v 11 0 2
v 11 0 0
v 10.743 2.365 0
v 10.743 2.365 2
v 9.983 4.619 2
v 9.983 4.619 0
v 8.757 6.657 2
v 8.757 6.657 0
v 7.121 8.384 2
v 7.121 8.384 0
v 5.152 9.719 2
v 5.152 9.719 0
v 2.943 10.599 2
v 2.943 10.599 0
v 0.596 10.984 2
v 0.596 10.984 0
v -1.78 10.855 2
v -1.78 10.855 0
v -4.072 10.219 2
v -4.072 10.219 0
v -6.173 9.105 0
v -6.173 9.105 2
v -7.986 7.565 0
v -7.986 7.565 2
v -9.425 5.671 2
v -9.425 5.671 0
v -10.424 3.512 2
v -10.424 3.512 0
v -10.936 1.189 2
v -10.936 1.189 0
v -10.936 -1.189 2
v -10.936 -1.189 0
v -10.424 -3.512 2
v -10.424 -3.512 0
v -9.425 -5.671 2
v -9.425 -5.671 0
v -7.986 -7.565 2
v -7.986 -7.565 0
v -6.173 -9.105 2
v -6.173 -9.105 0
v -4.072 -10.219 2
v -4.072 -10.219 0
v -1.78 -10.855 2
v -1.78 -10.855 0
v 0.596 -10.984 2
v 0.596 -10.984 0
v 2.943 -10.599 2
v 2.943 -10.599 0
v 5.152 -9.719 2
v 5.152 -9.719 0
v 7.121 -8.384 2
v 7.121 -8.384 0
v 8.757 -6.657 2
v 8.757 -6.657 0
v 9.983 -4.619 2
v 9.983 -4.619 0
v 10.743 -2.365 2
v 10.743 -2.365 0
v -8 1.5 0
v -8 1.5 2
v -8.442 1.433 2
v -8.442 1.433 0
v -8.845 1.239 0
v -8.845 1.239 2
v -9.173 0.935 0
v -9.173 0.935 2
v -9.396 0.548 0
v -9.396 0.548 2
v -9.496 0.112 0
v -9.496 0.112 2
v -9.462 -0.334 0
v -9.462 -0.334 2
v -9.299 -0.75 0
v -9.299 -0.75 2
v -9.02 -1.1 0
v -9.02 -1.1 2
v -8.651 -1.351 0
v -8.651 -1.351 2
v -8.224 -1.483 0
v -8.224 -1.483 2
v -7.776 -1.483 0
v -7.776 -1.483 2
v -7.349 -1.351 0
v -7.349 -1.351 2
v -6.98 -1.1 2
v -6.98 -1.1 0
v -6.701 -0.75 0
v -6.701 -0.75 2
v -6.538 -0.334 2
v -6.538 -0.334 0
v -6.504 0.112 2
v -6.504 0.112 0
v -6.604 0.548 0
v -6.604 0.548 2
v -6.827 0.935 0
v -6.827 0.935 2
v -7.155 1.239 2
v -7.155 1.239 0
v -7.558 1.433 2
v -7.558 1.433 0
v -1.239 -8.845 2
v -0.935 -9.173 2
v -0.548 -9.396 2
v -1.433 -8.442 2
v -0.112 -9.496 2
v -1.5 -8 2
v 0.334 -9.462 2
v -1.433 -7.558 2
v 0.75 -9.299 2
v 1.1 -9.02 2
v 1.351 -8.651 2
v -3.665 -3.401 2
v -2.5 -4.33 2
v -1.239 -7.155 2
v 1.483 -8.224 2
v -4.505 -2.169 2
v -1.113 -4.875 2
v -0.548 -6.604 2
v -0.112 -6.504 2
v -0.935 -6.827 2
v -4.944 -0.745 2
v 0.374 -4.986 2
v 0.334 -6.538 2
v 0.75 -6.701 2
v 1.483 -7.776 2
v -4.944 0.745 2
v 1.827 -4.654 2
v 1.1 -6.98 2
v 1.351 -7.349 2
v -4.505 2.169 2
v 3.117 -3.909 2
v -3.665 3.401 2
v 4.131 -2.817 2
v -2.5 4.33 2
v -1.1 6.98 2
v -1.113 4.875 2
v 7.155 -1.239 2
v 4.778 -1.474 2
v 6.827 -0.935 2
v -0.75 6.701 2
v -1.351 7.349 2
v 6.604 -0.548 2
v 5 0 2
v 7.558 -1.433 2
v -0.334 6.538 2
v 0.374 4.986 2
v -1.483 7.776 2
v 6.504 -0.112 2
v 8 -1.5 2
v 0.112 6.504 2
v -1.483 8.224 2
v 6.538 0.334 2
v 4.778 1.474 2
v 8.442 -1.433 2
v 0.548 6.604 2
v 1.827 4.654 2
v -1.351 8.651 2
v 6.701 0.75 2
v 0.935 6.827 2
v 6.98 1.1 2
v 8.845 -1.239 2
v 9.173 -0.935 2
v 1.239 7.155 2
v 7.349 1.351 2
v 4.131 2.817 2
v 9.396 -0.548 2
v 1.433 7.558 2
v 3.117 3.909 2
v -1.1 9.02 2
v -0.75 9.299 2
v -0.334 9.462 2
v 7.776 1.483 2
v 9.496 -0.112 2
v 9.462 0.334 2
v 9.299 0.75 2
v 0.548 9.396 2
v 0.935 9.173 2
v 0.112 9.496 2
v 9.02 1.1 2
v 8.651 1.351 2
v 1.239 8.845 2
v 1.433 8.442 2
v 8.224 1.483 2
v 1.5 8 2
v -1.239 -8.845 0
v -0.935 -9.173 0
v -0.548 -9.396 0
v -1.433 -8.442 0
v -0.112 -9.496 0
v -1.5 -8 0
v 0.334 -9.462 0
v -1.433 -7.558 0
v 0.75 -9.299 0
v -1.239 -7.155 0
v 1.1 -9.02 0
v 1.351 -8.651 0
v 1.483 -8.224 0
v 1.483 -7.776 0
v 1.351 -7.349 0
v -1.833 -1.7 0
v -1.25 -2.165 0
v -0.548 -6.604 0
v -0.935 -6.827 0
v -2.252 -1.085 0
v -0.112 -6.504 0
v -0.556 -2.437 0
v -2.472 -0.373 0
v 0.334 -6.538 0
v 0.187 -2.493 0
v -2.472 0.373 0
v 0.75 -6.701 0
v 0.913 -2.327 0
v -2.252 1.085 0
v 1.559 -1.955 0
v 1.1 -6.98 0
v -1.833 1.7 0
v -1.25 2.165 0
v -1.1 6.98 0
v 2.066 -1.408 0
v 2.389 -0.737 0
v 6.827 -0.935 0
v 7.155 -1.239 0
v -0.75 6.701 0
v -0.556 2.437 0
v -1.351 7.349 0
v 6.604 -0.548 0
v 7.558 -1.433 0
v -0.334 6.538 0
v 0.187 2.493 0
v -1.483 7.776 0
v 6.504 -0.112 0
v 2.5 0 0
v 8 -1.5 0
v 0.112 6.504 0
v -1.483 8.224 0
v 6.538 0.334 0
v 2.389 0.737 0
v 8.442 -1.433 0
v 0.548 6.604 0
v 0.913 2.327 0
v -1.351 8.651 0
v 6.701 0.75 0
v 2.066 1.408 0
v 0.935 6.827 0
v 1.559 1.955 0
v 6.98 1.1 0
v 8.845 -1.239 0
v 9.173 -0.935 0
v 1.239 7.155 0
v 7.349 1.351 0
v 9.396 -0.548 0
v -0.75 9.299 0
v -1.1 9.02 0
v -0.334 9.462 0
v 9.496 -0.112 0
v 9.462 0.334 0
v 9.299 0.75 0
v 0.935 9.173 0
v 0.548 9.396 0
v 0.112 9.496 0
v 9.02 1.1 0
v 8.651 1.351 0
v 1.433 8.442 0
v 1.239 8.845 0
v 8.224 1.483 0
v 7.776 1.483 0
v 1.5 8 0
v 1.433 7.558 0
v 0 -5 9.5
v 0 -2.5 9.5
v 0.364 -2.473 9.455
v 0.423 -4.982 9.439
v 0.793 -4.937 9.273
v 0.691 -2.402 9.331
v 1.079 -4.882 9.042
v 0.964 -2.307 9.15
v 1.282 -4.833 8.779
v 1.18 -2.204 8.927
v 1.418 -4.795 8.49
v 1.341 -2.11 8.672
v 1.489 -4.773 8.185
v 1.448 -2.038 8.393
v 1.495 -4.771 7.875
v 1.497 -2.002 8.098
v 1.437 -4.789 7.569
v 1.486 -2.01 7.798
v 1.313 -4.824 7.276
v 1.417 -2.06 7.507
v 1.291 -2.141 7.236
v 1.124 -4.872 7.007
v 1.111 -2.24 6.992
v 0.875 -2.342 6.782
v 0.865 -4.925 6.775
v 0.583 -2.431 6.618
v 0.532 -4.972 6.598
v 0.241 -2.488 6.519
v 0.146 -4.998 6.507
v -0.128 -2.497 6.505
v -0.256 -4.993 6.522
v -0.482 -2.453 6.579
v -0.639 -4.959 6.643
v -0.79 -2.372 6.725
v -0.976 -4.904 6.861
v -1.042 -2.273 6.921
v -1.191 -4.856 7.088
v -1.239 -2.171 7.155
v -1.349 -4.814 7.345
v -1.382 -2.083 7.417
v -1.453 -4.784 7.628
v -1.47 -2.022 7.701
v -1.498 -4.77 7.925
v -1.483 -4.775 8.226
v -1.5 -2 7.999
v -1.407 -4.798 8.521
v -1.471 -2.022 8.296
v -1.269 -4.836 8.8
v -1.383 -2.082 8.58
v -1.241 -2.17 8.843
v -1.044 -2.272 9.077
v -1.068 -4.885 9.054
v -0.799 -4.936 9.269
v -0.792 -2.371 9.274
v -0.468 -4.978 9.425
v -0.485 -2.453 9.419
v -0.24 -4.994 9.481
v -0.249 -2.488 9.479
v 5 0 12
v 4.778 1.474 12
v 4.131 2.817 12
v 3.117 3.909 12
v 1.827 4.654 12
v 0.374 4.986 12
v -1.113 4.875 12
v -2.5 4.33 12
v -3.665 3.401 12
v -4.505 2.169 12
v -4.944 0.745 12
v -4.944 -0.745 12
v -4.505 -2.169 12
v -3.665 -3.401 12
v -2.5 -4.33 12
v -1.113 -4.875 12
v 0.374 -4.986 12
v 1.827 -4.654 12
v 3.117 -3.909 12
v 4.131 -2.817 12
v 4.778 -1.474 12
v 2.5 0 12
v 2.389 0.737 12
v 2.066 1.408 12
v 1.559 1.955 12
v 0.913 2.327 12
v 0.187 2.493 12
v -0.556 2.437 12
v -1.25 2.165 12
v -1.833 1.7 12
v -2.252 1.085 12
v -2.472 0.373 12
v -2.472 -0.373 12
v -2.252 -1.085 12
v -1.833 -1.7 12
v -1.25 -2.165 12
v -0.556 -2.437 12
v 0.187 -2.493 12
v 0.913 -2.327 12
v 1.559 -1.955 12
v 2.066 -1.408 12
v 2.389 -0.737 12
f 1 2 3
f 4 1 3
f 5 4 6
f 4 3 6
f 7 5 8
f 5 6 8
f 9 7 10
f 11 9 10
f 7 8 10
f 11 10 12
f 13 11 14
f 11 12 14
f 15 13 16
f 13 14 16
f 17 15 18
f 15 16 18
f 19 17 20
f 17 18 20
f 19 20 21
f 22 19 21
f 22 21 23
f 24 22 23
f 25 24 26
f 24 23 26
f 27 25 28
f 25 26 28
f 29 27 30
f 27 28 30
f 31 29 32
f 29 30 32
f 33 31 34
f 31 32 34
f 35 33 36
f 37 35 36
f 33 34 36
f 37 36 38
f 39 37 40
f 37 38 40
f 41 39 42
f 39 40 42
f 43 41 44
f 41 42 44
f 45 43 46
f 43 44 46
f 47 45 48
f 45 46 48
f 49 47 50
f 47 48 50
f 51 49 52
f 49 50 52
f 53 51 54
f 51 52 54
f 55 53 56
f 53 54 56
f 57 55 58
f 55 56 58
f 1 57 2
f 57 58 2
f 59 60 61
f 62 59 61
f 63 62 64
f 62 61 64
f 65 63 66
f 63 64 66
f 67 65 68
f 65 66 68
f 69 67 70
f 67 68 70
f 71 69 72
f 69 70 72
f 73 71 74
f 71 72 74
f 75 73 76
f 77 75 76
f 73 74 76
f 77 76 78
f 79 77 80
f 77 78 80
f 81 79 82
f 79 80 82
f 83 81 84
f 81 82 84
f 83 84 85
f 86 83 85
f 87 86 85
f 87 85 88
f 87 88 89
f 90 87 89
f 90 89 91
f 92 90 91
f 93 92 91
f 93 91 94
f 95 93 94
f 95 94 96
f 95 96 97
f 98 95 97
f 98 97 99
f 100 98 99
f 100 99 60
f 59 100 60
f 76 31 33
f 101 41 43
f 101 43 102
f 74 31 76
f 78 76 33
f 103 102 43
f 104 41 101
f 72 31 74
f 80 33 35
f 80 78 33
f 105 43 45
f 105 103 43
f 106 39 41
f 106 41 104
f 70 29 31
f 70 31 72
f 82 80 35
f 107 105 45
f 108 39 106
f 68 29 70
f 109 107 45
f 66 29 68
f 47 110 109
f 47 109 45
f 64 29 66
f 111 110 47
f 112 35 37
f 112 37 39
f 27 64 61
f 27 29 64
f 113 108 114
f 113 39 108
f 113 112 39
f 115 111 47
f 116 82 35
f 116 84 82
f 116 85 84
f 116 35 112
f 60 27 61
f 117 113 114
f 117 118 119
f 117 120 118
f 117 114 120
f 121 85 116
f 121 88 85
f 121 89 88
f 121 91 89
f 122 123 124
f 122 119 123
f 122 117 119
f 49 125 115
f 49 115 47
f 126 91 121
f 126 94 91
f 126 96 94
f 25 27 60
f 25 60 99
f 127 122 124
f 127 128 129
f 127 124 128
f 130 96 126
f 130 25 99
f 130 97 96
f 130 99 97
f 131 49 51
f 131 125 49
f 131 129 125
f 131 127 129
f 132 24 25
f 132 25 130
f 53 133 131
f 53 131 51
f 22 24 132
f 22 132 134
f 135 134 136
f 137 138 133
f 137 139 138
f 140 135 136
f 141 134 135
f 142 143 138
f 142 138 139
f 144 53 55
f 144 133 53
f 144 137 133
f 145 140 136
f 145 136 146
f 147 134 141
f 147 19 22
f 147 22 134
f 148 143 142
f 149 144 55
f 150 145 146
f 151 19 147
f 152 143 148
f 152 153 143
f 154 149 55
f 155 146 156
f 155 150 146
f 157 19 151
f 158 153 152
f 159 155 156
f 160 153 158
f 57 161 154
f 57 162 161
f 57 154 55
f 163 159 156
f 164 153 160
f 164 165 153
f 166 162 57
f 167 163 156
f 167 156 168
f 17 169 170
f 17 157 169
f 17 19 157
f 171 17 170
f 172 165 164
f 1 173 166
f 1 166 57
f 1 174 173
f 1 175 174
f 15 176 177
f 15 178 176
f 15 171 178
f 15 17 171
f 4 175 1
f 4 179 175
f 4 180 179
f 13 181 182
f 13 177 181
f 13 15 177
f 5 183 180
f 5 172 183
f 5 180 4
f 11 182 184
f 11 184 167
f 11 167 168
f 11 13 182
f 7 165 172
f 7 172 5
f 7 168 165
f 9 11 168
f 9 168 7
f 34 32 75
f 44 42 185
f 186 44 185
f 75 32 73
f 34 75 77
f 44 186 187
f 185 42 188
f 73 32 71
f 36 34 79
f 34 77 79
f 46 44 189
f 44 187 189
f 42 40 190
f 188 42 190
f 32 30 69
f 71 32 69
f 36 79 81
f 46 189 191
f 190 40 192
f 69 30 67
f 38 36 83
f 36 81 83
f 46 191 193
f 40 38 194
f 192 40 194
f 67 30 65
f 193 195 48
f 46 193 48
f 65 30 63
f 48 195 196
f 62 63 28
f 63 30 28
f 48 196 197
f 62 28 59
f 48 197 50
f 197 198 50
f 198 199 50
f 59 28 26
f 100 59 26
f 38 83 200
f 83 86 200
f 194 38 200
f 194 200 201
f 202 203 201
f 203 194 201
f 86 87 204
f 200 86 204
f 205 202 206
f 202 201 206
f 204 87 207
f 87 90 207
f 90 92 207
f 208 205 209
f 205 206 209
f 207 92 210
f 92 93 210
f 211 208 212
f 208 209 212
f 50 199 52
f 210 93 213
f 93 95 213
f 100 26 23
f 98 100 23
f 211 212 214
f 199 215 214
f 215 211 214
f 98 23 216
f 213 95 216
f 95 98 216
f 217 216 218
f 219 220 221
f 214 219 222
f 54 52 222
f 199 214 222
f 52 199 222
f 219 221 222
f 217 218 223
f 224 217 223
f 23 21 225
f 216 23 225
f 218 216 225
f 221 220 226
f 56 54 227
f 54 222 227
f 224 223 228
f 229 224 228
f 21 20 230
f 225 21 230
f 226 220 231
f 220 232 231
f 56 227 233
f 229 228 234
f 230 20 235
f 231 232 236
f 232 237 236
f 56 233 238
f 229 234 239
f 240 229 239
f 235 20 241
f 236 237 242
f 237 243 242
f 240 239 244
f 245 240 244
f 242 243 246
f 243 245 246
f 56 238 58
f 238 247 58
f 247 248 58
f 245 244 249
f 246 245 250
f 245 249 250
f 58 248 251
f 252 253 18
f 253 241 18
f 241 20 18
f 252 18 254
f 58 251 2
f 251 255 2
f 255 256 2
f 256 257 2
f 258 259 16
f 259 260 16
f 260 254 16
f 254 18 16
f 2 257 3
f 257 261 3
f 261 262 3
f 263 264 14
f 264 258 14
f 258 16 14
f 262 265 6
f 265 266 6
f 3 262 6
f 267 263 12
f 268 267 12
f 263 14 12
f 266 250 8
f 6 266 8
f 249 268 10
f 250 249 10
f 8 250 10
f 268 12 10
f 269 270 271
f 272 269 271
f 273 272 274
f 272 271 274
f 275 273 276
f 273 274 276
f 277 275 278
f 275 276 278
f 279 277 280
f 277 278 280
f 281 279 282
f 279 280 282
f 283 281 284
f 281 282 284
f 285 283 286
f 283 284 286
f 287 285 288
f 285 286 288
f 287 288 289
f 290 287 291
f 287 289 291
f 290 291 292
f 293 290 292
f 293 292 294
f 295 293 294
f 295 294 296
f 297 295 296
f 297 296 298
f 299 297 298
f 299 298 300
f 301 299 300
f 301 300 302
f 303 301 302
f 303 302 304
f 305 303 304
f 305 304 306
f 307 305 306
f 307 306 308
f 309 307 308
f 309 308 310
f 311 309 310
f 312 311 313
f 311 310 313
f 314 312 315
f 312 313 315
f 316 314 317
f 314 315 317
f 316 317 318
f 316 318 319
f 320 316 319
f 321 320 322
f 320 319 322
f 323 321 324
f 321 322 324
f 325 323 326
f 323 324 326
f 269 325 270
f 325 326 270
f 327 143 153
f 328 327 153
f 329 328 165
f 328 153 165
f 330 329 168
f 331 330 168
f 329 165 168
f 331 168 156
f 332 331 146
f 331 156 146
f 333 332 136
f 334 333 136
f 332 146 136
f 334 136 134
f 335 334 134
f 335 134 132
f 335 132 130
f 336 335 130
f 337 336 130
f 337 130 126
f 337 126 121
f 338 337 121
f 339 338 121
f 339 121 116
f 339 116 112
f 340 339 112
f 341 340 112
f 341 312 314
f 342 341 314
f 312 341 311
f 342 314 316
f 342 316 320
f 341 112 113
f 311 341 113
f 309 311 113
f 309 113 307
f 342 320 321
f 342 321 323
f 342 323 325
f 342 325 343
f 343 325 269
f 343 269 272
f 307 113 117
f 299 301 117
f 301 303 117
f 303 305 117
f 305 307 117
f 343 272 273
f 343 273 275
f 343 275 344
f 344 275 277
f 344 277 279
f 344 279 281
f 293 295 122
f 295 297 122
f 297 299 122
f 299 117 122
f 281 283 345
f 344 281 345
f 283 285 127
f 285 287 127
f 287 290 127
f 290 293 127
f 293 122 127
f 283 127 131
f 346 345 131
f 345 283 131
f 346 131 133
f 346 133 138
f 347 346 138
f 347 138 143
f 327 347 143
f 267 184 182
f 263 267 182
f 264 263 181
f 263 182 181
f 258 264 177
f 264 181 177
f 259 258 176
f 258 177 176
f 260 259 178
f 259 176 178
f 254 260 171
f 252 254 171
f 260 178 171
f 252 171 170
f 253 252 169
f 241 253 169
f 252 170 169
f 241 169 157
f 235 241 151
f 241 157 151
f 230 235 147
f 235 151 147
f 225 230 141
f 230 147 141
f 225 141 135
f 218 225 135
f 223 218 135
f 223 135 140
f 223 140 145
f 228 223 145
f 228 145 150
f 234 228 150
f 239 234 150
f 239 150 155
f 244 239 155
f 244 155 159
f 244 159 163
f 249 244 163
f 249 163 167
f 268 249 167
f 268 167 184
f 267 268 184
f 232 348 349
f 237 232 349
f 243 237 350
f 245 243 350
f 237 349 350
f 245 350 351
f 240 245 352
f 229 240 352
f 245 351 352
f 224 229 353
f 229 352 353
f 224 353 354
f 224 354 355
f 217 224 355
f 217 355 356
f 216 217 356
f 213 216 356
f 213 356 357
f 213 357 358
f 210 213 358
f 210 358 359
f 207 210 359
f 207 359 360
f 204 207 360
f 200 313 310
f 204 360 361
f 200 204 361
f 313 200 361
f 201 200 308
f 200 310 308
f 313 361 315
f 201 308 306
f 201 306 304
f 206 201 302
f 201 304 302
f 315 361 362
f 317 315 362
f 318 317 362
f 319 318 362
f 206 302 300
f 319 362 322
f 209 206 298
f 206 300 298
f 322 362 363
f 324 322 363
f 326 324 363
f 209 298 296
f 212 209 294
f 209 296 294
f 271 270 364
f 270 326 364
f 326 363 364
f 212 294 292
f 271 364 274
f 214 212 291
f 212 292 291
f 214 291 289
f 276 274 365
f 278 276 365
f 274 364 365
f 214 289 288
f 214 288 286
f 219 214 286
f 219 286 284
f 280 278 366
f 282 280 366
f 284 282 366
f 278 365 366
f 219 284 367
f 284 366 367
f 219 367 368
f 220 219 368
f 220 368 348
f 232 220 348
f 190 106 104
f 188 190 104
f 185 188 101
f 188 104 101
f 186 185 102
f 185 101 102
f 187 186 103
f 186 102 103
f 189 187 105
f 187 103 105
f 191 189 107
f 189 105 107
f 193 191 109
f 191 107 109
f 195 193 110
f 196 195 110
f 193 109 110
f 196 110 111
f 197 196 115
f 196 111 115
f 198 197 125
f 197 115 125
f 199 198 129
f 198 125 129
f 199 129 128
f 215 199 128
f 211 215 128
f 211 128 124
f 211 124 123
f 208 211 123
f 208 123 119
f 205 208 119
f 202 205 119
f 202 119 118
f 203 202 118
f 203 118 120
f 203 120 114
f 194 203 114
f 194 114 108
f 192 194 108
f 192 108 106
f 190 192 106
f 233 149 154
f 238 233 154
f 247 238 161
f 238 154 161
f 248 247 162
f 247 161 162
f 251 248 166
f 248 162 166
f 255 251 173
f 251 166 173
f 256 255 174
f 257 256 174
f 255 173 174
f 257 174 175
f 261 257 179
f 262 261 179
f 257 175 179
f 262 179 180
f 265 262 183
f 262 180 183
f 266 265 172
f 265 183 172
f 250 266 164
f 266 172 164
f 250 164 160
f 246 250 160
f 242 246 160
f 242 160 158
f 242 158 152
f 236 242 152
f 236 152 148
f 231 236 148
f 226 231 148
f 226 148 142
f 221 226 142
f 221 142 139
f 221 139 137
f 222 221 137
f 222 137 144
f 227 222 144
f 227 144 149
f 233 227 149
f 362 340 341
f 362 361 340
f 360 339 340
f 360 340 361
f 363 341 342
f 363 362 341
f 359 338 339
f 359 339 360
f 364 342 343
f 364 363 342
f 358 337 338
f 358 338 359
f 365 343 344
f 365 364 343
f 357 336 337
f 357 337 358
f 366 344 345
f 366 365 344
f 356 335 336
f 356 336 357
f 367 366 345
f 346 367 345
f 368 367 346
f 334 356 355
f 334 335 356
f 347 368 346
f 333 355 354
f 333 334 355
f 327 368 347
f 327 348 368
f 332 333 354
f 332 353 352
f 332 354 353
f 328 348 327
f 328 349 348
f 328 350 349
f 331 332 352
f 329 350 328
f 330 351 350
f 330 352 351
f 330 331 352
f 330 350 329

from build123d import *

# Parameters (mm, degrees)
SKETCH2_R           = 10.999999971
BOSS_EXTRUDE1_DEPTH = 2
SKETCH3_R           = 5
BOSS_EXTRUDE2_DEPTH = 10
SKETCH4_R           = 2.5
CUT_EXTRUDE1_DEPTH  = 20.646882672
SKETCH5_R           = 1.500000048
CUT_EXTRUDE2_DEPTH  = 10
SKETCH6_R           = 1.5
CUT_EXTRUDE3_DEPTH  = 19.493242028
CIRPATTERN1_COUNT   = 4


with BuildPart() as part:
    # Sketch2 → Boss-Extrude1 (new body)
    with BuildSketch(Plane.XY):
        Circle(SKETCH2_R)
    extrude(amount=BOSS_EXTRUDE1_DEPTH)

    # Sketch3 → Boss-Extrude2 (add)
    with BuildSketch(Plane.XY.offset(2)):
        Circle(SKETCH3_R)
    extrude(amount=BOSS_EXTRUDE2_DEPTH)

    # Sketch4 → Cut-Extrude1 (cut, through all)
    with BuildSketch(Plane.XY.offset(12)):
        Circle(SKETCH4_R)
    extrude(amount=-CUT_EXTRUDE1_DEPTH, mode=Mode.SUBTRACT)

    # Sketch5 → Cut-Extrude2 (cut)
    with BuildSketch(Plane(origin=(0, 0, 0), x_dir=(1, 0, 0), z_dir=(0, 1, 0))):
        with Locations(Location((0, -8, 0), (0, 0, 270))):
            Circle(SKETCH5_R)
    extrude(amount=-CUT_EXTRUDE2_DEPTH, mode=Mode.SUBTRACT)

    # Sketch6 → Cut-Extrude3 (cut, through all)
    with BuildSketch(Plane.XY.offset(2)):
        with Locations((0, 8)):
            Circle(SKETCH6_R)
    cut_extrude3 = extrude(amount=-CUT_EXTRUDE3_DEPTH, mode=Mode.SUBTRACT)

    # CirPattern1: Cut-Extrude3 ×4 about axis
    cirpattern1_axis = Axis((0, 0, 0), (0, 0, 1))
    for i in range(1, CIRPATTERN1_COUNT):
        add(cut_extrude3.rotate(cirpattern1_axis, i * 360 / CIRPATTERN1_COUNT), mode=Mode.SUBTRACT)


solid = part.part
